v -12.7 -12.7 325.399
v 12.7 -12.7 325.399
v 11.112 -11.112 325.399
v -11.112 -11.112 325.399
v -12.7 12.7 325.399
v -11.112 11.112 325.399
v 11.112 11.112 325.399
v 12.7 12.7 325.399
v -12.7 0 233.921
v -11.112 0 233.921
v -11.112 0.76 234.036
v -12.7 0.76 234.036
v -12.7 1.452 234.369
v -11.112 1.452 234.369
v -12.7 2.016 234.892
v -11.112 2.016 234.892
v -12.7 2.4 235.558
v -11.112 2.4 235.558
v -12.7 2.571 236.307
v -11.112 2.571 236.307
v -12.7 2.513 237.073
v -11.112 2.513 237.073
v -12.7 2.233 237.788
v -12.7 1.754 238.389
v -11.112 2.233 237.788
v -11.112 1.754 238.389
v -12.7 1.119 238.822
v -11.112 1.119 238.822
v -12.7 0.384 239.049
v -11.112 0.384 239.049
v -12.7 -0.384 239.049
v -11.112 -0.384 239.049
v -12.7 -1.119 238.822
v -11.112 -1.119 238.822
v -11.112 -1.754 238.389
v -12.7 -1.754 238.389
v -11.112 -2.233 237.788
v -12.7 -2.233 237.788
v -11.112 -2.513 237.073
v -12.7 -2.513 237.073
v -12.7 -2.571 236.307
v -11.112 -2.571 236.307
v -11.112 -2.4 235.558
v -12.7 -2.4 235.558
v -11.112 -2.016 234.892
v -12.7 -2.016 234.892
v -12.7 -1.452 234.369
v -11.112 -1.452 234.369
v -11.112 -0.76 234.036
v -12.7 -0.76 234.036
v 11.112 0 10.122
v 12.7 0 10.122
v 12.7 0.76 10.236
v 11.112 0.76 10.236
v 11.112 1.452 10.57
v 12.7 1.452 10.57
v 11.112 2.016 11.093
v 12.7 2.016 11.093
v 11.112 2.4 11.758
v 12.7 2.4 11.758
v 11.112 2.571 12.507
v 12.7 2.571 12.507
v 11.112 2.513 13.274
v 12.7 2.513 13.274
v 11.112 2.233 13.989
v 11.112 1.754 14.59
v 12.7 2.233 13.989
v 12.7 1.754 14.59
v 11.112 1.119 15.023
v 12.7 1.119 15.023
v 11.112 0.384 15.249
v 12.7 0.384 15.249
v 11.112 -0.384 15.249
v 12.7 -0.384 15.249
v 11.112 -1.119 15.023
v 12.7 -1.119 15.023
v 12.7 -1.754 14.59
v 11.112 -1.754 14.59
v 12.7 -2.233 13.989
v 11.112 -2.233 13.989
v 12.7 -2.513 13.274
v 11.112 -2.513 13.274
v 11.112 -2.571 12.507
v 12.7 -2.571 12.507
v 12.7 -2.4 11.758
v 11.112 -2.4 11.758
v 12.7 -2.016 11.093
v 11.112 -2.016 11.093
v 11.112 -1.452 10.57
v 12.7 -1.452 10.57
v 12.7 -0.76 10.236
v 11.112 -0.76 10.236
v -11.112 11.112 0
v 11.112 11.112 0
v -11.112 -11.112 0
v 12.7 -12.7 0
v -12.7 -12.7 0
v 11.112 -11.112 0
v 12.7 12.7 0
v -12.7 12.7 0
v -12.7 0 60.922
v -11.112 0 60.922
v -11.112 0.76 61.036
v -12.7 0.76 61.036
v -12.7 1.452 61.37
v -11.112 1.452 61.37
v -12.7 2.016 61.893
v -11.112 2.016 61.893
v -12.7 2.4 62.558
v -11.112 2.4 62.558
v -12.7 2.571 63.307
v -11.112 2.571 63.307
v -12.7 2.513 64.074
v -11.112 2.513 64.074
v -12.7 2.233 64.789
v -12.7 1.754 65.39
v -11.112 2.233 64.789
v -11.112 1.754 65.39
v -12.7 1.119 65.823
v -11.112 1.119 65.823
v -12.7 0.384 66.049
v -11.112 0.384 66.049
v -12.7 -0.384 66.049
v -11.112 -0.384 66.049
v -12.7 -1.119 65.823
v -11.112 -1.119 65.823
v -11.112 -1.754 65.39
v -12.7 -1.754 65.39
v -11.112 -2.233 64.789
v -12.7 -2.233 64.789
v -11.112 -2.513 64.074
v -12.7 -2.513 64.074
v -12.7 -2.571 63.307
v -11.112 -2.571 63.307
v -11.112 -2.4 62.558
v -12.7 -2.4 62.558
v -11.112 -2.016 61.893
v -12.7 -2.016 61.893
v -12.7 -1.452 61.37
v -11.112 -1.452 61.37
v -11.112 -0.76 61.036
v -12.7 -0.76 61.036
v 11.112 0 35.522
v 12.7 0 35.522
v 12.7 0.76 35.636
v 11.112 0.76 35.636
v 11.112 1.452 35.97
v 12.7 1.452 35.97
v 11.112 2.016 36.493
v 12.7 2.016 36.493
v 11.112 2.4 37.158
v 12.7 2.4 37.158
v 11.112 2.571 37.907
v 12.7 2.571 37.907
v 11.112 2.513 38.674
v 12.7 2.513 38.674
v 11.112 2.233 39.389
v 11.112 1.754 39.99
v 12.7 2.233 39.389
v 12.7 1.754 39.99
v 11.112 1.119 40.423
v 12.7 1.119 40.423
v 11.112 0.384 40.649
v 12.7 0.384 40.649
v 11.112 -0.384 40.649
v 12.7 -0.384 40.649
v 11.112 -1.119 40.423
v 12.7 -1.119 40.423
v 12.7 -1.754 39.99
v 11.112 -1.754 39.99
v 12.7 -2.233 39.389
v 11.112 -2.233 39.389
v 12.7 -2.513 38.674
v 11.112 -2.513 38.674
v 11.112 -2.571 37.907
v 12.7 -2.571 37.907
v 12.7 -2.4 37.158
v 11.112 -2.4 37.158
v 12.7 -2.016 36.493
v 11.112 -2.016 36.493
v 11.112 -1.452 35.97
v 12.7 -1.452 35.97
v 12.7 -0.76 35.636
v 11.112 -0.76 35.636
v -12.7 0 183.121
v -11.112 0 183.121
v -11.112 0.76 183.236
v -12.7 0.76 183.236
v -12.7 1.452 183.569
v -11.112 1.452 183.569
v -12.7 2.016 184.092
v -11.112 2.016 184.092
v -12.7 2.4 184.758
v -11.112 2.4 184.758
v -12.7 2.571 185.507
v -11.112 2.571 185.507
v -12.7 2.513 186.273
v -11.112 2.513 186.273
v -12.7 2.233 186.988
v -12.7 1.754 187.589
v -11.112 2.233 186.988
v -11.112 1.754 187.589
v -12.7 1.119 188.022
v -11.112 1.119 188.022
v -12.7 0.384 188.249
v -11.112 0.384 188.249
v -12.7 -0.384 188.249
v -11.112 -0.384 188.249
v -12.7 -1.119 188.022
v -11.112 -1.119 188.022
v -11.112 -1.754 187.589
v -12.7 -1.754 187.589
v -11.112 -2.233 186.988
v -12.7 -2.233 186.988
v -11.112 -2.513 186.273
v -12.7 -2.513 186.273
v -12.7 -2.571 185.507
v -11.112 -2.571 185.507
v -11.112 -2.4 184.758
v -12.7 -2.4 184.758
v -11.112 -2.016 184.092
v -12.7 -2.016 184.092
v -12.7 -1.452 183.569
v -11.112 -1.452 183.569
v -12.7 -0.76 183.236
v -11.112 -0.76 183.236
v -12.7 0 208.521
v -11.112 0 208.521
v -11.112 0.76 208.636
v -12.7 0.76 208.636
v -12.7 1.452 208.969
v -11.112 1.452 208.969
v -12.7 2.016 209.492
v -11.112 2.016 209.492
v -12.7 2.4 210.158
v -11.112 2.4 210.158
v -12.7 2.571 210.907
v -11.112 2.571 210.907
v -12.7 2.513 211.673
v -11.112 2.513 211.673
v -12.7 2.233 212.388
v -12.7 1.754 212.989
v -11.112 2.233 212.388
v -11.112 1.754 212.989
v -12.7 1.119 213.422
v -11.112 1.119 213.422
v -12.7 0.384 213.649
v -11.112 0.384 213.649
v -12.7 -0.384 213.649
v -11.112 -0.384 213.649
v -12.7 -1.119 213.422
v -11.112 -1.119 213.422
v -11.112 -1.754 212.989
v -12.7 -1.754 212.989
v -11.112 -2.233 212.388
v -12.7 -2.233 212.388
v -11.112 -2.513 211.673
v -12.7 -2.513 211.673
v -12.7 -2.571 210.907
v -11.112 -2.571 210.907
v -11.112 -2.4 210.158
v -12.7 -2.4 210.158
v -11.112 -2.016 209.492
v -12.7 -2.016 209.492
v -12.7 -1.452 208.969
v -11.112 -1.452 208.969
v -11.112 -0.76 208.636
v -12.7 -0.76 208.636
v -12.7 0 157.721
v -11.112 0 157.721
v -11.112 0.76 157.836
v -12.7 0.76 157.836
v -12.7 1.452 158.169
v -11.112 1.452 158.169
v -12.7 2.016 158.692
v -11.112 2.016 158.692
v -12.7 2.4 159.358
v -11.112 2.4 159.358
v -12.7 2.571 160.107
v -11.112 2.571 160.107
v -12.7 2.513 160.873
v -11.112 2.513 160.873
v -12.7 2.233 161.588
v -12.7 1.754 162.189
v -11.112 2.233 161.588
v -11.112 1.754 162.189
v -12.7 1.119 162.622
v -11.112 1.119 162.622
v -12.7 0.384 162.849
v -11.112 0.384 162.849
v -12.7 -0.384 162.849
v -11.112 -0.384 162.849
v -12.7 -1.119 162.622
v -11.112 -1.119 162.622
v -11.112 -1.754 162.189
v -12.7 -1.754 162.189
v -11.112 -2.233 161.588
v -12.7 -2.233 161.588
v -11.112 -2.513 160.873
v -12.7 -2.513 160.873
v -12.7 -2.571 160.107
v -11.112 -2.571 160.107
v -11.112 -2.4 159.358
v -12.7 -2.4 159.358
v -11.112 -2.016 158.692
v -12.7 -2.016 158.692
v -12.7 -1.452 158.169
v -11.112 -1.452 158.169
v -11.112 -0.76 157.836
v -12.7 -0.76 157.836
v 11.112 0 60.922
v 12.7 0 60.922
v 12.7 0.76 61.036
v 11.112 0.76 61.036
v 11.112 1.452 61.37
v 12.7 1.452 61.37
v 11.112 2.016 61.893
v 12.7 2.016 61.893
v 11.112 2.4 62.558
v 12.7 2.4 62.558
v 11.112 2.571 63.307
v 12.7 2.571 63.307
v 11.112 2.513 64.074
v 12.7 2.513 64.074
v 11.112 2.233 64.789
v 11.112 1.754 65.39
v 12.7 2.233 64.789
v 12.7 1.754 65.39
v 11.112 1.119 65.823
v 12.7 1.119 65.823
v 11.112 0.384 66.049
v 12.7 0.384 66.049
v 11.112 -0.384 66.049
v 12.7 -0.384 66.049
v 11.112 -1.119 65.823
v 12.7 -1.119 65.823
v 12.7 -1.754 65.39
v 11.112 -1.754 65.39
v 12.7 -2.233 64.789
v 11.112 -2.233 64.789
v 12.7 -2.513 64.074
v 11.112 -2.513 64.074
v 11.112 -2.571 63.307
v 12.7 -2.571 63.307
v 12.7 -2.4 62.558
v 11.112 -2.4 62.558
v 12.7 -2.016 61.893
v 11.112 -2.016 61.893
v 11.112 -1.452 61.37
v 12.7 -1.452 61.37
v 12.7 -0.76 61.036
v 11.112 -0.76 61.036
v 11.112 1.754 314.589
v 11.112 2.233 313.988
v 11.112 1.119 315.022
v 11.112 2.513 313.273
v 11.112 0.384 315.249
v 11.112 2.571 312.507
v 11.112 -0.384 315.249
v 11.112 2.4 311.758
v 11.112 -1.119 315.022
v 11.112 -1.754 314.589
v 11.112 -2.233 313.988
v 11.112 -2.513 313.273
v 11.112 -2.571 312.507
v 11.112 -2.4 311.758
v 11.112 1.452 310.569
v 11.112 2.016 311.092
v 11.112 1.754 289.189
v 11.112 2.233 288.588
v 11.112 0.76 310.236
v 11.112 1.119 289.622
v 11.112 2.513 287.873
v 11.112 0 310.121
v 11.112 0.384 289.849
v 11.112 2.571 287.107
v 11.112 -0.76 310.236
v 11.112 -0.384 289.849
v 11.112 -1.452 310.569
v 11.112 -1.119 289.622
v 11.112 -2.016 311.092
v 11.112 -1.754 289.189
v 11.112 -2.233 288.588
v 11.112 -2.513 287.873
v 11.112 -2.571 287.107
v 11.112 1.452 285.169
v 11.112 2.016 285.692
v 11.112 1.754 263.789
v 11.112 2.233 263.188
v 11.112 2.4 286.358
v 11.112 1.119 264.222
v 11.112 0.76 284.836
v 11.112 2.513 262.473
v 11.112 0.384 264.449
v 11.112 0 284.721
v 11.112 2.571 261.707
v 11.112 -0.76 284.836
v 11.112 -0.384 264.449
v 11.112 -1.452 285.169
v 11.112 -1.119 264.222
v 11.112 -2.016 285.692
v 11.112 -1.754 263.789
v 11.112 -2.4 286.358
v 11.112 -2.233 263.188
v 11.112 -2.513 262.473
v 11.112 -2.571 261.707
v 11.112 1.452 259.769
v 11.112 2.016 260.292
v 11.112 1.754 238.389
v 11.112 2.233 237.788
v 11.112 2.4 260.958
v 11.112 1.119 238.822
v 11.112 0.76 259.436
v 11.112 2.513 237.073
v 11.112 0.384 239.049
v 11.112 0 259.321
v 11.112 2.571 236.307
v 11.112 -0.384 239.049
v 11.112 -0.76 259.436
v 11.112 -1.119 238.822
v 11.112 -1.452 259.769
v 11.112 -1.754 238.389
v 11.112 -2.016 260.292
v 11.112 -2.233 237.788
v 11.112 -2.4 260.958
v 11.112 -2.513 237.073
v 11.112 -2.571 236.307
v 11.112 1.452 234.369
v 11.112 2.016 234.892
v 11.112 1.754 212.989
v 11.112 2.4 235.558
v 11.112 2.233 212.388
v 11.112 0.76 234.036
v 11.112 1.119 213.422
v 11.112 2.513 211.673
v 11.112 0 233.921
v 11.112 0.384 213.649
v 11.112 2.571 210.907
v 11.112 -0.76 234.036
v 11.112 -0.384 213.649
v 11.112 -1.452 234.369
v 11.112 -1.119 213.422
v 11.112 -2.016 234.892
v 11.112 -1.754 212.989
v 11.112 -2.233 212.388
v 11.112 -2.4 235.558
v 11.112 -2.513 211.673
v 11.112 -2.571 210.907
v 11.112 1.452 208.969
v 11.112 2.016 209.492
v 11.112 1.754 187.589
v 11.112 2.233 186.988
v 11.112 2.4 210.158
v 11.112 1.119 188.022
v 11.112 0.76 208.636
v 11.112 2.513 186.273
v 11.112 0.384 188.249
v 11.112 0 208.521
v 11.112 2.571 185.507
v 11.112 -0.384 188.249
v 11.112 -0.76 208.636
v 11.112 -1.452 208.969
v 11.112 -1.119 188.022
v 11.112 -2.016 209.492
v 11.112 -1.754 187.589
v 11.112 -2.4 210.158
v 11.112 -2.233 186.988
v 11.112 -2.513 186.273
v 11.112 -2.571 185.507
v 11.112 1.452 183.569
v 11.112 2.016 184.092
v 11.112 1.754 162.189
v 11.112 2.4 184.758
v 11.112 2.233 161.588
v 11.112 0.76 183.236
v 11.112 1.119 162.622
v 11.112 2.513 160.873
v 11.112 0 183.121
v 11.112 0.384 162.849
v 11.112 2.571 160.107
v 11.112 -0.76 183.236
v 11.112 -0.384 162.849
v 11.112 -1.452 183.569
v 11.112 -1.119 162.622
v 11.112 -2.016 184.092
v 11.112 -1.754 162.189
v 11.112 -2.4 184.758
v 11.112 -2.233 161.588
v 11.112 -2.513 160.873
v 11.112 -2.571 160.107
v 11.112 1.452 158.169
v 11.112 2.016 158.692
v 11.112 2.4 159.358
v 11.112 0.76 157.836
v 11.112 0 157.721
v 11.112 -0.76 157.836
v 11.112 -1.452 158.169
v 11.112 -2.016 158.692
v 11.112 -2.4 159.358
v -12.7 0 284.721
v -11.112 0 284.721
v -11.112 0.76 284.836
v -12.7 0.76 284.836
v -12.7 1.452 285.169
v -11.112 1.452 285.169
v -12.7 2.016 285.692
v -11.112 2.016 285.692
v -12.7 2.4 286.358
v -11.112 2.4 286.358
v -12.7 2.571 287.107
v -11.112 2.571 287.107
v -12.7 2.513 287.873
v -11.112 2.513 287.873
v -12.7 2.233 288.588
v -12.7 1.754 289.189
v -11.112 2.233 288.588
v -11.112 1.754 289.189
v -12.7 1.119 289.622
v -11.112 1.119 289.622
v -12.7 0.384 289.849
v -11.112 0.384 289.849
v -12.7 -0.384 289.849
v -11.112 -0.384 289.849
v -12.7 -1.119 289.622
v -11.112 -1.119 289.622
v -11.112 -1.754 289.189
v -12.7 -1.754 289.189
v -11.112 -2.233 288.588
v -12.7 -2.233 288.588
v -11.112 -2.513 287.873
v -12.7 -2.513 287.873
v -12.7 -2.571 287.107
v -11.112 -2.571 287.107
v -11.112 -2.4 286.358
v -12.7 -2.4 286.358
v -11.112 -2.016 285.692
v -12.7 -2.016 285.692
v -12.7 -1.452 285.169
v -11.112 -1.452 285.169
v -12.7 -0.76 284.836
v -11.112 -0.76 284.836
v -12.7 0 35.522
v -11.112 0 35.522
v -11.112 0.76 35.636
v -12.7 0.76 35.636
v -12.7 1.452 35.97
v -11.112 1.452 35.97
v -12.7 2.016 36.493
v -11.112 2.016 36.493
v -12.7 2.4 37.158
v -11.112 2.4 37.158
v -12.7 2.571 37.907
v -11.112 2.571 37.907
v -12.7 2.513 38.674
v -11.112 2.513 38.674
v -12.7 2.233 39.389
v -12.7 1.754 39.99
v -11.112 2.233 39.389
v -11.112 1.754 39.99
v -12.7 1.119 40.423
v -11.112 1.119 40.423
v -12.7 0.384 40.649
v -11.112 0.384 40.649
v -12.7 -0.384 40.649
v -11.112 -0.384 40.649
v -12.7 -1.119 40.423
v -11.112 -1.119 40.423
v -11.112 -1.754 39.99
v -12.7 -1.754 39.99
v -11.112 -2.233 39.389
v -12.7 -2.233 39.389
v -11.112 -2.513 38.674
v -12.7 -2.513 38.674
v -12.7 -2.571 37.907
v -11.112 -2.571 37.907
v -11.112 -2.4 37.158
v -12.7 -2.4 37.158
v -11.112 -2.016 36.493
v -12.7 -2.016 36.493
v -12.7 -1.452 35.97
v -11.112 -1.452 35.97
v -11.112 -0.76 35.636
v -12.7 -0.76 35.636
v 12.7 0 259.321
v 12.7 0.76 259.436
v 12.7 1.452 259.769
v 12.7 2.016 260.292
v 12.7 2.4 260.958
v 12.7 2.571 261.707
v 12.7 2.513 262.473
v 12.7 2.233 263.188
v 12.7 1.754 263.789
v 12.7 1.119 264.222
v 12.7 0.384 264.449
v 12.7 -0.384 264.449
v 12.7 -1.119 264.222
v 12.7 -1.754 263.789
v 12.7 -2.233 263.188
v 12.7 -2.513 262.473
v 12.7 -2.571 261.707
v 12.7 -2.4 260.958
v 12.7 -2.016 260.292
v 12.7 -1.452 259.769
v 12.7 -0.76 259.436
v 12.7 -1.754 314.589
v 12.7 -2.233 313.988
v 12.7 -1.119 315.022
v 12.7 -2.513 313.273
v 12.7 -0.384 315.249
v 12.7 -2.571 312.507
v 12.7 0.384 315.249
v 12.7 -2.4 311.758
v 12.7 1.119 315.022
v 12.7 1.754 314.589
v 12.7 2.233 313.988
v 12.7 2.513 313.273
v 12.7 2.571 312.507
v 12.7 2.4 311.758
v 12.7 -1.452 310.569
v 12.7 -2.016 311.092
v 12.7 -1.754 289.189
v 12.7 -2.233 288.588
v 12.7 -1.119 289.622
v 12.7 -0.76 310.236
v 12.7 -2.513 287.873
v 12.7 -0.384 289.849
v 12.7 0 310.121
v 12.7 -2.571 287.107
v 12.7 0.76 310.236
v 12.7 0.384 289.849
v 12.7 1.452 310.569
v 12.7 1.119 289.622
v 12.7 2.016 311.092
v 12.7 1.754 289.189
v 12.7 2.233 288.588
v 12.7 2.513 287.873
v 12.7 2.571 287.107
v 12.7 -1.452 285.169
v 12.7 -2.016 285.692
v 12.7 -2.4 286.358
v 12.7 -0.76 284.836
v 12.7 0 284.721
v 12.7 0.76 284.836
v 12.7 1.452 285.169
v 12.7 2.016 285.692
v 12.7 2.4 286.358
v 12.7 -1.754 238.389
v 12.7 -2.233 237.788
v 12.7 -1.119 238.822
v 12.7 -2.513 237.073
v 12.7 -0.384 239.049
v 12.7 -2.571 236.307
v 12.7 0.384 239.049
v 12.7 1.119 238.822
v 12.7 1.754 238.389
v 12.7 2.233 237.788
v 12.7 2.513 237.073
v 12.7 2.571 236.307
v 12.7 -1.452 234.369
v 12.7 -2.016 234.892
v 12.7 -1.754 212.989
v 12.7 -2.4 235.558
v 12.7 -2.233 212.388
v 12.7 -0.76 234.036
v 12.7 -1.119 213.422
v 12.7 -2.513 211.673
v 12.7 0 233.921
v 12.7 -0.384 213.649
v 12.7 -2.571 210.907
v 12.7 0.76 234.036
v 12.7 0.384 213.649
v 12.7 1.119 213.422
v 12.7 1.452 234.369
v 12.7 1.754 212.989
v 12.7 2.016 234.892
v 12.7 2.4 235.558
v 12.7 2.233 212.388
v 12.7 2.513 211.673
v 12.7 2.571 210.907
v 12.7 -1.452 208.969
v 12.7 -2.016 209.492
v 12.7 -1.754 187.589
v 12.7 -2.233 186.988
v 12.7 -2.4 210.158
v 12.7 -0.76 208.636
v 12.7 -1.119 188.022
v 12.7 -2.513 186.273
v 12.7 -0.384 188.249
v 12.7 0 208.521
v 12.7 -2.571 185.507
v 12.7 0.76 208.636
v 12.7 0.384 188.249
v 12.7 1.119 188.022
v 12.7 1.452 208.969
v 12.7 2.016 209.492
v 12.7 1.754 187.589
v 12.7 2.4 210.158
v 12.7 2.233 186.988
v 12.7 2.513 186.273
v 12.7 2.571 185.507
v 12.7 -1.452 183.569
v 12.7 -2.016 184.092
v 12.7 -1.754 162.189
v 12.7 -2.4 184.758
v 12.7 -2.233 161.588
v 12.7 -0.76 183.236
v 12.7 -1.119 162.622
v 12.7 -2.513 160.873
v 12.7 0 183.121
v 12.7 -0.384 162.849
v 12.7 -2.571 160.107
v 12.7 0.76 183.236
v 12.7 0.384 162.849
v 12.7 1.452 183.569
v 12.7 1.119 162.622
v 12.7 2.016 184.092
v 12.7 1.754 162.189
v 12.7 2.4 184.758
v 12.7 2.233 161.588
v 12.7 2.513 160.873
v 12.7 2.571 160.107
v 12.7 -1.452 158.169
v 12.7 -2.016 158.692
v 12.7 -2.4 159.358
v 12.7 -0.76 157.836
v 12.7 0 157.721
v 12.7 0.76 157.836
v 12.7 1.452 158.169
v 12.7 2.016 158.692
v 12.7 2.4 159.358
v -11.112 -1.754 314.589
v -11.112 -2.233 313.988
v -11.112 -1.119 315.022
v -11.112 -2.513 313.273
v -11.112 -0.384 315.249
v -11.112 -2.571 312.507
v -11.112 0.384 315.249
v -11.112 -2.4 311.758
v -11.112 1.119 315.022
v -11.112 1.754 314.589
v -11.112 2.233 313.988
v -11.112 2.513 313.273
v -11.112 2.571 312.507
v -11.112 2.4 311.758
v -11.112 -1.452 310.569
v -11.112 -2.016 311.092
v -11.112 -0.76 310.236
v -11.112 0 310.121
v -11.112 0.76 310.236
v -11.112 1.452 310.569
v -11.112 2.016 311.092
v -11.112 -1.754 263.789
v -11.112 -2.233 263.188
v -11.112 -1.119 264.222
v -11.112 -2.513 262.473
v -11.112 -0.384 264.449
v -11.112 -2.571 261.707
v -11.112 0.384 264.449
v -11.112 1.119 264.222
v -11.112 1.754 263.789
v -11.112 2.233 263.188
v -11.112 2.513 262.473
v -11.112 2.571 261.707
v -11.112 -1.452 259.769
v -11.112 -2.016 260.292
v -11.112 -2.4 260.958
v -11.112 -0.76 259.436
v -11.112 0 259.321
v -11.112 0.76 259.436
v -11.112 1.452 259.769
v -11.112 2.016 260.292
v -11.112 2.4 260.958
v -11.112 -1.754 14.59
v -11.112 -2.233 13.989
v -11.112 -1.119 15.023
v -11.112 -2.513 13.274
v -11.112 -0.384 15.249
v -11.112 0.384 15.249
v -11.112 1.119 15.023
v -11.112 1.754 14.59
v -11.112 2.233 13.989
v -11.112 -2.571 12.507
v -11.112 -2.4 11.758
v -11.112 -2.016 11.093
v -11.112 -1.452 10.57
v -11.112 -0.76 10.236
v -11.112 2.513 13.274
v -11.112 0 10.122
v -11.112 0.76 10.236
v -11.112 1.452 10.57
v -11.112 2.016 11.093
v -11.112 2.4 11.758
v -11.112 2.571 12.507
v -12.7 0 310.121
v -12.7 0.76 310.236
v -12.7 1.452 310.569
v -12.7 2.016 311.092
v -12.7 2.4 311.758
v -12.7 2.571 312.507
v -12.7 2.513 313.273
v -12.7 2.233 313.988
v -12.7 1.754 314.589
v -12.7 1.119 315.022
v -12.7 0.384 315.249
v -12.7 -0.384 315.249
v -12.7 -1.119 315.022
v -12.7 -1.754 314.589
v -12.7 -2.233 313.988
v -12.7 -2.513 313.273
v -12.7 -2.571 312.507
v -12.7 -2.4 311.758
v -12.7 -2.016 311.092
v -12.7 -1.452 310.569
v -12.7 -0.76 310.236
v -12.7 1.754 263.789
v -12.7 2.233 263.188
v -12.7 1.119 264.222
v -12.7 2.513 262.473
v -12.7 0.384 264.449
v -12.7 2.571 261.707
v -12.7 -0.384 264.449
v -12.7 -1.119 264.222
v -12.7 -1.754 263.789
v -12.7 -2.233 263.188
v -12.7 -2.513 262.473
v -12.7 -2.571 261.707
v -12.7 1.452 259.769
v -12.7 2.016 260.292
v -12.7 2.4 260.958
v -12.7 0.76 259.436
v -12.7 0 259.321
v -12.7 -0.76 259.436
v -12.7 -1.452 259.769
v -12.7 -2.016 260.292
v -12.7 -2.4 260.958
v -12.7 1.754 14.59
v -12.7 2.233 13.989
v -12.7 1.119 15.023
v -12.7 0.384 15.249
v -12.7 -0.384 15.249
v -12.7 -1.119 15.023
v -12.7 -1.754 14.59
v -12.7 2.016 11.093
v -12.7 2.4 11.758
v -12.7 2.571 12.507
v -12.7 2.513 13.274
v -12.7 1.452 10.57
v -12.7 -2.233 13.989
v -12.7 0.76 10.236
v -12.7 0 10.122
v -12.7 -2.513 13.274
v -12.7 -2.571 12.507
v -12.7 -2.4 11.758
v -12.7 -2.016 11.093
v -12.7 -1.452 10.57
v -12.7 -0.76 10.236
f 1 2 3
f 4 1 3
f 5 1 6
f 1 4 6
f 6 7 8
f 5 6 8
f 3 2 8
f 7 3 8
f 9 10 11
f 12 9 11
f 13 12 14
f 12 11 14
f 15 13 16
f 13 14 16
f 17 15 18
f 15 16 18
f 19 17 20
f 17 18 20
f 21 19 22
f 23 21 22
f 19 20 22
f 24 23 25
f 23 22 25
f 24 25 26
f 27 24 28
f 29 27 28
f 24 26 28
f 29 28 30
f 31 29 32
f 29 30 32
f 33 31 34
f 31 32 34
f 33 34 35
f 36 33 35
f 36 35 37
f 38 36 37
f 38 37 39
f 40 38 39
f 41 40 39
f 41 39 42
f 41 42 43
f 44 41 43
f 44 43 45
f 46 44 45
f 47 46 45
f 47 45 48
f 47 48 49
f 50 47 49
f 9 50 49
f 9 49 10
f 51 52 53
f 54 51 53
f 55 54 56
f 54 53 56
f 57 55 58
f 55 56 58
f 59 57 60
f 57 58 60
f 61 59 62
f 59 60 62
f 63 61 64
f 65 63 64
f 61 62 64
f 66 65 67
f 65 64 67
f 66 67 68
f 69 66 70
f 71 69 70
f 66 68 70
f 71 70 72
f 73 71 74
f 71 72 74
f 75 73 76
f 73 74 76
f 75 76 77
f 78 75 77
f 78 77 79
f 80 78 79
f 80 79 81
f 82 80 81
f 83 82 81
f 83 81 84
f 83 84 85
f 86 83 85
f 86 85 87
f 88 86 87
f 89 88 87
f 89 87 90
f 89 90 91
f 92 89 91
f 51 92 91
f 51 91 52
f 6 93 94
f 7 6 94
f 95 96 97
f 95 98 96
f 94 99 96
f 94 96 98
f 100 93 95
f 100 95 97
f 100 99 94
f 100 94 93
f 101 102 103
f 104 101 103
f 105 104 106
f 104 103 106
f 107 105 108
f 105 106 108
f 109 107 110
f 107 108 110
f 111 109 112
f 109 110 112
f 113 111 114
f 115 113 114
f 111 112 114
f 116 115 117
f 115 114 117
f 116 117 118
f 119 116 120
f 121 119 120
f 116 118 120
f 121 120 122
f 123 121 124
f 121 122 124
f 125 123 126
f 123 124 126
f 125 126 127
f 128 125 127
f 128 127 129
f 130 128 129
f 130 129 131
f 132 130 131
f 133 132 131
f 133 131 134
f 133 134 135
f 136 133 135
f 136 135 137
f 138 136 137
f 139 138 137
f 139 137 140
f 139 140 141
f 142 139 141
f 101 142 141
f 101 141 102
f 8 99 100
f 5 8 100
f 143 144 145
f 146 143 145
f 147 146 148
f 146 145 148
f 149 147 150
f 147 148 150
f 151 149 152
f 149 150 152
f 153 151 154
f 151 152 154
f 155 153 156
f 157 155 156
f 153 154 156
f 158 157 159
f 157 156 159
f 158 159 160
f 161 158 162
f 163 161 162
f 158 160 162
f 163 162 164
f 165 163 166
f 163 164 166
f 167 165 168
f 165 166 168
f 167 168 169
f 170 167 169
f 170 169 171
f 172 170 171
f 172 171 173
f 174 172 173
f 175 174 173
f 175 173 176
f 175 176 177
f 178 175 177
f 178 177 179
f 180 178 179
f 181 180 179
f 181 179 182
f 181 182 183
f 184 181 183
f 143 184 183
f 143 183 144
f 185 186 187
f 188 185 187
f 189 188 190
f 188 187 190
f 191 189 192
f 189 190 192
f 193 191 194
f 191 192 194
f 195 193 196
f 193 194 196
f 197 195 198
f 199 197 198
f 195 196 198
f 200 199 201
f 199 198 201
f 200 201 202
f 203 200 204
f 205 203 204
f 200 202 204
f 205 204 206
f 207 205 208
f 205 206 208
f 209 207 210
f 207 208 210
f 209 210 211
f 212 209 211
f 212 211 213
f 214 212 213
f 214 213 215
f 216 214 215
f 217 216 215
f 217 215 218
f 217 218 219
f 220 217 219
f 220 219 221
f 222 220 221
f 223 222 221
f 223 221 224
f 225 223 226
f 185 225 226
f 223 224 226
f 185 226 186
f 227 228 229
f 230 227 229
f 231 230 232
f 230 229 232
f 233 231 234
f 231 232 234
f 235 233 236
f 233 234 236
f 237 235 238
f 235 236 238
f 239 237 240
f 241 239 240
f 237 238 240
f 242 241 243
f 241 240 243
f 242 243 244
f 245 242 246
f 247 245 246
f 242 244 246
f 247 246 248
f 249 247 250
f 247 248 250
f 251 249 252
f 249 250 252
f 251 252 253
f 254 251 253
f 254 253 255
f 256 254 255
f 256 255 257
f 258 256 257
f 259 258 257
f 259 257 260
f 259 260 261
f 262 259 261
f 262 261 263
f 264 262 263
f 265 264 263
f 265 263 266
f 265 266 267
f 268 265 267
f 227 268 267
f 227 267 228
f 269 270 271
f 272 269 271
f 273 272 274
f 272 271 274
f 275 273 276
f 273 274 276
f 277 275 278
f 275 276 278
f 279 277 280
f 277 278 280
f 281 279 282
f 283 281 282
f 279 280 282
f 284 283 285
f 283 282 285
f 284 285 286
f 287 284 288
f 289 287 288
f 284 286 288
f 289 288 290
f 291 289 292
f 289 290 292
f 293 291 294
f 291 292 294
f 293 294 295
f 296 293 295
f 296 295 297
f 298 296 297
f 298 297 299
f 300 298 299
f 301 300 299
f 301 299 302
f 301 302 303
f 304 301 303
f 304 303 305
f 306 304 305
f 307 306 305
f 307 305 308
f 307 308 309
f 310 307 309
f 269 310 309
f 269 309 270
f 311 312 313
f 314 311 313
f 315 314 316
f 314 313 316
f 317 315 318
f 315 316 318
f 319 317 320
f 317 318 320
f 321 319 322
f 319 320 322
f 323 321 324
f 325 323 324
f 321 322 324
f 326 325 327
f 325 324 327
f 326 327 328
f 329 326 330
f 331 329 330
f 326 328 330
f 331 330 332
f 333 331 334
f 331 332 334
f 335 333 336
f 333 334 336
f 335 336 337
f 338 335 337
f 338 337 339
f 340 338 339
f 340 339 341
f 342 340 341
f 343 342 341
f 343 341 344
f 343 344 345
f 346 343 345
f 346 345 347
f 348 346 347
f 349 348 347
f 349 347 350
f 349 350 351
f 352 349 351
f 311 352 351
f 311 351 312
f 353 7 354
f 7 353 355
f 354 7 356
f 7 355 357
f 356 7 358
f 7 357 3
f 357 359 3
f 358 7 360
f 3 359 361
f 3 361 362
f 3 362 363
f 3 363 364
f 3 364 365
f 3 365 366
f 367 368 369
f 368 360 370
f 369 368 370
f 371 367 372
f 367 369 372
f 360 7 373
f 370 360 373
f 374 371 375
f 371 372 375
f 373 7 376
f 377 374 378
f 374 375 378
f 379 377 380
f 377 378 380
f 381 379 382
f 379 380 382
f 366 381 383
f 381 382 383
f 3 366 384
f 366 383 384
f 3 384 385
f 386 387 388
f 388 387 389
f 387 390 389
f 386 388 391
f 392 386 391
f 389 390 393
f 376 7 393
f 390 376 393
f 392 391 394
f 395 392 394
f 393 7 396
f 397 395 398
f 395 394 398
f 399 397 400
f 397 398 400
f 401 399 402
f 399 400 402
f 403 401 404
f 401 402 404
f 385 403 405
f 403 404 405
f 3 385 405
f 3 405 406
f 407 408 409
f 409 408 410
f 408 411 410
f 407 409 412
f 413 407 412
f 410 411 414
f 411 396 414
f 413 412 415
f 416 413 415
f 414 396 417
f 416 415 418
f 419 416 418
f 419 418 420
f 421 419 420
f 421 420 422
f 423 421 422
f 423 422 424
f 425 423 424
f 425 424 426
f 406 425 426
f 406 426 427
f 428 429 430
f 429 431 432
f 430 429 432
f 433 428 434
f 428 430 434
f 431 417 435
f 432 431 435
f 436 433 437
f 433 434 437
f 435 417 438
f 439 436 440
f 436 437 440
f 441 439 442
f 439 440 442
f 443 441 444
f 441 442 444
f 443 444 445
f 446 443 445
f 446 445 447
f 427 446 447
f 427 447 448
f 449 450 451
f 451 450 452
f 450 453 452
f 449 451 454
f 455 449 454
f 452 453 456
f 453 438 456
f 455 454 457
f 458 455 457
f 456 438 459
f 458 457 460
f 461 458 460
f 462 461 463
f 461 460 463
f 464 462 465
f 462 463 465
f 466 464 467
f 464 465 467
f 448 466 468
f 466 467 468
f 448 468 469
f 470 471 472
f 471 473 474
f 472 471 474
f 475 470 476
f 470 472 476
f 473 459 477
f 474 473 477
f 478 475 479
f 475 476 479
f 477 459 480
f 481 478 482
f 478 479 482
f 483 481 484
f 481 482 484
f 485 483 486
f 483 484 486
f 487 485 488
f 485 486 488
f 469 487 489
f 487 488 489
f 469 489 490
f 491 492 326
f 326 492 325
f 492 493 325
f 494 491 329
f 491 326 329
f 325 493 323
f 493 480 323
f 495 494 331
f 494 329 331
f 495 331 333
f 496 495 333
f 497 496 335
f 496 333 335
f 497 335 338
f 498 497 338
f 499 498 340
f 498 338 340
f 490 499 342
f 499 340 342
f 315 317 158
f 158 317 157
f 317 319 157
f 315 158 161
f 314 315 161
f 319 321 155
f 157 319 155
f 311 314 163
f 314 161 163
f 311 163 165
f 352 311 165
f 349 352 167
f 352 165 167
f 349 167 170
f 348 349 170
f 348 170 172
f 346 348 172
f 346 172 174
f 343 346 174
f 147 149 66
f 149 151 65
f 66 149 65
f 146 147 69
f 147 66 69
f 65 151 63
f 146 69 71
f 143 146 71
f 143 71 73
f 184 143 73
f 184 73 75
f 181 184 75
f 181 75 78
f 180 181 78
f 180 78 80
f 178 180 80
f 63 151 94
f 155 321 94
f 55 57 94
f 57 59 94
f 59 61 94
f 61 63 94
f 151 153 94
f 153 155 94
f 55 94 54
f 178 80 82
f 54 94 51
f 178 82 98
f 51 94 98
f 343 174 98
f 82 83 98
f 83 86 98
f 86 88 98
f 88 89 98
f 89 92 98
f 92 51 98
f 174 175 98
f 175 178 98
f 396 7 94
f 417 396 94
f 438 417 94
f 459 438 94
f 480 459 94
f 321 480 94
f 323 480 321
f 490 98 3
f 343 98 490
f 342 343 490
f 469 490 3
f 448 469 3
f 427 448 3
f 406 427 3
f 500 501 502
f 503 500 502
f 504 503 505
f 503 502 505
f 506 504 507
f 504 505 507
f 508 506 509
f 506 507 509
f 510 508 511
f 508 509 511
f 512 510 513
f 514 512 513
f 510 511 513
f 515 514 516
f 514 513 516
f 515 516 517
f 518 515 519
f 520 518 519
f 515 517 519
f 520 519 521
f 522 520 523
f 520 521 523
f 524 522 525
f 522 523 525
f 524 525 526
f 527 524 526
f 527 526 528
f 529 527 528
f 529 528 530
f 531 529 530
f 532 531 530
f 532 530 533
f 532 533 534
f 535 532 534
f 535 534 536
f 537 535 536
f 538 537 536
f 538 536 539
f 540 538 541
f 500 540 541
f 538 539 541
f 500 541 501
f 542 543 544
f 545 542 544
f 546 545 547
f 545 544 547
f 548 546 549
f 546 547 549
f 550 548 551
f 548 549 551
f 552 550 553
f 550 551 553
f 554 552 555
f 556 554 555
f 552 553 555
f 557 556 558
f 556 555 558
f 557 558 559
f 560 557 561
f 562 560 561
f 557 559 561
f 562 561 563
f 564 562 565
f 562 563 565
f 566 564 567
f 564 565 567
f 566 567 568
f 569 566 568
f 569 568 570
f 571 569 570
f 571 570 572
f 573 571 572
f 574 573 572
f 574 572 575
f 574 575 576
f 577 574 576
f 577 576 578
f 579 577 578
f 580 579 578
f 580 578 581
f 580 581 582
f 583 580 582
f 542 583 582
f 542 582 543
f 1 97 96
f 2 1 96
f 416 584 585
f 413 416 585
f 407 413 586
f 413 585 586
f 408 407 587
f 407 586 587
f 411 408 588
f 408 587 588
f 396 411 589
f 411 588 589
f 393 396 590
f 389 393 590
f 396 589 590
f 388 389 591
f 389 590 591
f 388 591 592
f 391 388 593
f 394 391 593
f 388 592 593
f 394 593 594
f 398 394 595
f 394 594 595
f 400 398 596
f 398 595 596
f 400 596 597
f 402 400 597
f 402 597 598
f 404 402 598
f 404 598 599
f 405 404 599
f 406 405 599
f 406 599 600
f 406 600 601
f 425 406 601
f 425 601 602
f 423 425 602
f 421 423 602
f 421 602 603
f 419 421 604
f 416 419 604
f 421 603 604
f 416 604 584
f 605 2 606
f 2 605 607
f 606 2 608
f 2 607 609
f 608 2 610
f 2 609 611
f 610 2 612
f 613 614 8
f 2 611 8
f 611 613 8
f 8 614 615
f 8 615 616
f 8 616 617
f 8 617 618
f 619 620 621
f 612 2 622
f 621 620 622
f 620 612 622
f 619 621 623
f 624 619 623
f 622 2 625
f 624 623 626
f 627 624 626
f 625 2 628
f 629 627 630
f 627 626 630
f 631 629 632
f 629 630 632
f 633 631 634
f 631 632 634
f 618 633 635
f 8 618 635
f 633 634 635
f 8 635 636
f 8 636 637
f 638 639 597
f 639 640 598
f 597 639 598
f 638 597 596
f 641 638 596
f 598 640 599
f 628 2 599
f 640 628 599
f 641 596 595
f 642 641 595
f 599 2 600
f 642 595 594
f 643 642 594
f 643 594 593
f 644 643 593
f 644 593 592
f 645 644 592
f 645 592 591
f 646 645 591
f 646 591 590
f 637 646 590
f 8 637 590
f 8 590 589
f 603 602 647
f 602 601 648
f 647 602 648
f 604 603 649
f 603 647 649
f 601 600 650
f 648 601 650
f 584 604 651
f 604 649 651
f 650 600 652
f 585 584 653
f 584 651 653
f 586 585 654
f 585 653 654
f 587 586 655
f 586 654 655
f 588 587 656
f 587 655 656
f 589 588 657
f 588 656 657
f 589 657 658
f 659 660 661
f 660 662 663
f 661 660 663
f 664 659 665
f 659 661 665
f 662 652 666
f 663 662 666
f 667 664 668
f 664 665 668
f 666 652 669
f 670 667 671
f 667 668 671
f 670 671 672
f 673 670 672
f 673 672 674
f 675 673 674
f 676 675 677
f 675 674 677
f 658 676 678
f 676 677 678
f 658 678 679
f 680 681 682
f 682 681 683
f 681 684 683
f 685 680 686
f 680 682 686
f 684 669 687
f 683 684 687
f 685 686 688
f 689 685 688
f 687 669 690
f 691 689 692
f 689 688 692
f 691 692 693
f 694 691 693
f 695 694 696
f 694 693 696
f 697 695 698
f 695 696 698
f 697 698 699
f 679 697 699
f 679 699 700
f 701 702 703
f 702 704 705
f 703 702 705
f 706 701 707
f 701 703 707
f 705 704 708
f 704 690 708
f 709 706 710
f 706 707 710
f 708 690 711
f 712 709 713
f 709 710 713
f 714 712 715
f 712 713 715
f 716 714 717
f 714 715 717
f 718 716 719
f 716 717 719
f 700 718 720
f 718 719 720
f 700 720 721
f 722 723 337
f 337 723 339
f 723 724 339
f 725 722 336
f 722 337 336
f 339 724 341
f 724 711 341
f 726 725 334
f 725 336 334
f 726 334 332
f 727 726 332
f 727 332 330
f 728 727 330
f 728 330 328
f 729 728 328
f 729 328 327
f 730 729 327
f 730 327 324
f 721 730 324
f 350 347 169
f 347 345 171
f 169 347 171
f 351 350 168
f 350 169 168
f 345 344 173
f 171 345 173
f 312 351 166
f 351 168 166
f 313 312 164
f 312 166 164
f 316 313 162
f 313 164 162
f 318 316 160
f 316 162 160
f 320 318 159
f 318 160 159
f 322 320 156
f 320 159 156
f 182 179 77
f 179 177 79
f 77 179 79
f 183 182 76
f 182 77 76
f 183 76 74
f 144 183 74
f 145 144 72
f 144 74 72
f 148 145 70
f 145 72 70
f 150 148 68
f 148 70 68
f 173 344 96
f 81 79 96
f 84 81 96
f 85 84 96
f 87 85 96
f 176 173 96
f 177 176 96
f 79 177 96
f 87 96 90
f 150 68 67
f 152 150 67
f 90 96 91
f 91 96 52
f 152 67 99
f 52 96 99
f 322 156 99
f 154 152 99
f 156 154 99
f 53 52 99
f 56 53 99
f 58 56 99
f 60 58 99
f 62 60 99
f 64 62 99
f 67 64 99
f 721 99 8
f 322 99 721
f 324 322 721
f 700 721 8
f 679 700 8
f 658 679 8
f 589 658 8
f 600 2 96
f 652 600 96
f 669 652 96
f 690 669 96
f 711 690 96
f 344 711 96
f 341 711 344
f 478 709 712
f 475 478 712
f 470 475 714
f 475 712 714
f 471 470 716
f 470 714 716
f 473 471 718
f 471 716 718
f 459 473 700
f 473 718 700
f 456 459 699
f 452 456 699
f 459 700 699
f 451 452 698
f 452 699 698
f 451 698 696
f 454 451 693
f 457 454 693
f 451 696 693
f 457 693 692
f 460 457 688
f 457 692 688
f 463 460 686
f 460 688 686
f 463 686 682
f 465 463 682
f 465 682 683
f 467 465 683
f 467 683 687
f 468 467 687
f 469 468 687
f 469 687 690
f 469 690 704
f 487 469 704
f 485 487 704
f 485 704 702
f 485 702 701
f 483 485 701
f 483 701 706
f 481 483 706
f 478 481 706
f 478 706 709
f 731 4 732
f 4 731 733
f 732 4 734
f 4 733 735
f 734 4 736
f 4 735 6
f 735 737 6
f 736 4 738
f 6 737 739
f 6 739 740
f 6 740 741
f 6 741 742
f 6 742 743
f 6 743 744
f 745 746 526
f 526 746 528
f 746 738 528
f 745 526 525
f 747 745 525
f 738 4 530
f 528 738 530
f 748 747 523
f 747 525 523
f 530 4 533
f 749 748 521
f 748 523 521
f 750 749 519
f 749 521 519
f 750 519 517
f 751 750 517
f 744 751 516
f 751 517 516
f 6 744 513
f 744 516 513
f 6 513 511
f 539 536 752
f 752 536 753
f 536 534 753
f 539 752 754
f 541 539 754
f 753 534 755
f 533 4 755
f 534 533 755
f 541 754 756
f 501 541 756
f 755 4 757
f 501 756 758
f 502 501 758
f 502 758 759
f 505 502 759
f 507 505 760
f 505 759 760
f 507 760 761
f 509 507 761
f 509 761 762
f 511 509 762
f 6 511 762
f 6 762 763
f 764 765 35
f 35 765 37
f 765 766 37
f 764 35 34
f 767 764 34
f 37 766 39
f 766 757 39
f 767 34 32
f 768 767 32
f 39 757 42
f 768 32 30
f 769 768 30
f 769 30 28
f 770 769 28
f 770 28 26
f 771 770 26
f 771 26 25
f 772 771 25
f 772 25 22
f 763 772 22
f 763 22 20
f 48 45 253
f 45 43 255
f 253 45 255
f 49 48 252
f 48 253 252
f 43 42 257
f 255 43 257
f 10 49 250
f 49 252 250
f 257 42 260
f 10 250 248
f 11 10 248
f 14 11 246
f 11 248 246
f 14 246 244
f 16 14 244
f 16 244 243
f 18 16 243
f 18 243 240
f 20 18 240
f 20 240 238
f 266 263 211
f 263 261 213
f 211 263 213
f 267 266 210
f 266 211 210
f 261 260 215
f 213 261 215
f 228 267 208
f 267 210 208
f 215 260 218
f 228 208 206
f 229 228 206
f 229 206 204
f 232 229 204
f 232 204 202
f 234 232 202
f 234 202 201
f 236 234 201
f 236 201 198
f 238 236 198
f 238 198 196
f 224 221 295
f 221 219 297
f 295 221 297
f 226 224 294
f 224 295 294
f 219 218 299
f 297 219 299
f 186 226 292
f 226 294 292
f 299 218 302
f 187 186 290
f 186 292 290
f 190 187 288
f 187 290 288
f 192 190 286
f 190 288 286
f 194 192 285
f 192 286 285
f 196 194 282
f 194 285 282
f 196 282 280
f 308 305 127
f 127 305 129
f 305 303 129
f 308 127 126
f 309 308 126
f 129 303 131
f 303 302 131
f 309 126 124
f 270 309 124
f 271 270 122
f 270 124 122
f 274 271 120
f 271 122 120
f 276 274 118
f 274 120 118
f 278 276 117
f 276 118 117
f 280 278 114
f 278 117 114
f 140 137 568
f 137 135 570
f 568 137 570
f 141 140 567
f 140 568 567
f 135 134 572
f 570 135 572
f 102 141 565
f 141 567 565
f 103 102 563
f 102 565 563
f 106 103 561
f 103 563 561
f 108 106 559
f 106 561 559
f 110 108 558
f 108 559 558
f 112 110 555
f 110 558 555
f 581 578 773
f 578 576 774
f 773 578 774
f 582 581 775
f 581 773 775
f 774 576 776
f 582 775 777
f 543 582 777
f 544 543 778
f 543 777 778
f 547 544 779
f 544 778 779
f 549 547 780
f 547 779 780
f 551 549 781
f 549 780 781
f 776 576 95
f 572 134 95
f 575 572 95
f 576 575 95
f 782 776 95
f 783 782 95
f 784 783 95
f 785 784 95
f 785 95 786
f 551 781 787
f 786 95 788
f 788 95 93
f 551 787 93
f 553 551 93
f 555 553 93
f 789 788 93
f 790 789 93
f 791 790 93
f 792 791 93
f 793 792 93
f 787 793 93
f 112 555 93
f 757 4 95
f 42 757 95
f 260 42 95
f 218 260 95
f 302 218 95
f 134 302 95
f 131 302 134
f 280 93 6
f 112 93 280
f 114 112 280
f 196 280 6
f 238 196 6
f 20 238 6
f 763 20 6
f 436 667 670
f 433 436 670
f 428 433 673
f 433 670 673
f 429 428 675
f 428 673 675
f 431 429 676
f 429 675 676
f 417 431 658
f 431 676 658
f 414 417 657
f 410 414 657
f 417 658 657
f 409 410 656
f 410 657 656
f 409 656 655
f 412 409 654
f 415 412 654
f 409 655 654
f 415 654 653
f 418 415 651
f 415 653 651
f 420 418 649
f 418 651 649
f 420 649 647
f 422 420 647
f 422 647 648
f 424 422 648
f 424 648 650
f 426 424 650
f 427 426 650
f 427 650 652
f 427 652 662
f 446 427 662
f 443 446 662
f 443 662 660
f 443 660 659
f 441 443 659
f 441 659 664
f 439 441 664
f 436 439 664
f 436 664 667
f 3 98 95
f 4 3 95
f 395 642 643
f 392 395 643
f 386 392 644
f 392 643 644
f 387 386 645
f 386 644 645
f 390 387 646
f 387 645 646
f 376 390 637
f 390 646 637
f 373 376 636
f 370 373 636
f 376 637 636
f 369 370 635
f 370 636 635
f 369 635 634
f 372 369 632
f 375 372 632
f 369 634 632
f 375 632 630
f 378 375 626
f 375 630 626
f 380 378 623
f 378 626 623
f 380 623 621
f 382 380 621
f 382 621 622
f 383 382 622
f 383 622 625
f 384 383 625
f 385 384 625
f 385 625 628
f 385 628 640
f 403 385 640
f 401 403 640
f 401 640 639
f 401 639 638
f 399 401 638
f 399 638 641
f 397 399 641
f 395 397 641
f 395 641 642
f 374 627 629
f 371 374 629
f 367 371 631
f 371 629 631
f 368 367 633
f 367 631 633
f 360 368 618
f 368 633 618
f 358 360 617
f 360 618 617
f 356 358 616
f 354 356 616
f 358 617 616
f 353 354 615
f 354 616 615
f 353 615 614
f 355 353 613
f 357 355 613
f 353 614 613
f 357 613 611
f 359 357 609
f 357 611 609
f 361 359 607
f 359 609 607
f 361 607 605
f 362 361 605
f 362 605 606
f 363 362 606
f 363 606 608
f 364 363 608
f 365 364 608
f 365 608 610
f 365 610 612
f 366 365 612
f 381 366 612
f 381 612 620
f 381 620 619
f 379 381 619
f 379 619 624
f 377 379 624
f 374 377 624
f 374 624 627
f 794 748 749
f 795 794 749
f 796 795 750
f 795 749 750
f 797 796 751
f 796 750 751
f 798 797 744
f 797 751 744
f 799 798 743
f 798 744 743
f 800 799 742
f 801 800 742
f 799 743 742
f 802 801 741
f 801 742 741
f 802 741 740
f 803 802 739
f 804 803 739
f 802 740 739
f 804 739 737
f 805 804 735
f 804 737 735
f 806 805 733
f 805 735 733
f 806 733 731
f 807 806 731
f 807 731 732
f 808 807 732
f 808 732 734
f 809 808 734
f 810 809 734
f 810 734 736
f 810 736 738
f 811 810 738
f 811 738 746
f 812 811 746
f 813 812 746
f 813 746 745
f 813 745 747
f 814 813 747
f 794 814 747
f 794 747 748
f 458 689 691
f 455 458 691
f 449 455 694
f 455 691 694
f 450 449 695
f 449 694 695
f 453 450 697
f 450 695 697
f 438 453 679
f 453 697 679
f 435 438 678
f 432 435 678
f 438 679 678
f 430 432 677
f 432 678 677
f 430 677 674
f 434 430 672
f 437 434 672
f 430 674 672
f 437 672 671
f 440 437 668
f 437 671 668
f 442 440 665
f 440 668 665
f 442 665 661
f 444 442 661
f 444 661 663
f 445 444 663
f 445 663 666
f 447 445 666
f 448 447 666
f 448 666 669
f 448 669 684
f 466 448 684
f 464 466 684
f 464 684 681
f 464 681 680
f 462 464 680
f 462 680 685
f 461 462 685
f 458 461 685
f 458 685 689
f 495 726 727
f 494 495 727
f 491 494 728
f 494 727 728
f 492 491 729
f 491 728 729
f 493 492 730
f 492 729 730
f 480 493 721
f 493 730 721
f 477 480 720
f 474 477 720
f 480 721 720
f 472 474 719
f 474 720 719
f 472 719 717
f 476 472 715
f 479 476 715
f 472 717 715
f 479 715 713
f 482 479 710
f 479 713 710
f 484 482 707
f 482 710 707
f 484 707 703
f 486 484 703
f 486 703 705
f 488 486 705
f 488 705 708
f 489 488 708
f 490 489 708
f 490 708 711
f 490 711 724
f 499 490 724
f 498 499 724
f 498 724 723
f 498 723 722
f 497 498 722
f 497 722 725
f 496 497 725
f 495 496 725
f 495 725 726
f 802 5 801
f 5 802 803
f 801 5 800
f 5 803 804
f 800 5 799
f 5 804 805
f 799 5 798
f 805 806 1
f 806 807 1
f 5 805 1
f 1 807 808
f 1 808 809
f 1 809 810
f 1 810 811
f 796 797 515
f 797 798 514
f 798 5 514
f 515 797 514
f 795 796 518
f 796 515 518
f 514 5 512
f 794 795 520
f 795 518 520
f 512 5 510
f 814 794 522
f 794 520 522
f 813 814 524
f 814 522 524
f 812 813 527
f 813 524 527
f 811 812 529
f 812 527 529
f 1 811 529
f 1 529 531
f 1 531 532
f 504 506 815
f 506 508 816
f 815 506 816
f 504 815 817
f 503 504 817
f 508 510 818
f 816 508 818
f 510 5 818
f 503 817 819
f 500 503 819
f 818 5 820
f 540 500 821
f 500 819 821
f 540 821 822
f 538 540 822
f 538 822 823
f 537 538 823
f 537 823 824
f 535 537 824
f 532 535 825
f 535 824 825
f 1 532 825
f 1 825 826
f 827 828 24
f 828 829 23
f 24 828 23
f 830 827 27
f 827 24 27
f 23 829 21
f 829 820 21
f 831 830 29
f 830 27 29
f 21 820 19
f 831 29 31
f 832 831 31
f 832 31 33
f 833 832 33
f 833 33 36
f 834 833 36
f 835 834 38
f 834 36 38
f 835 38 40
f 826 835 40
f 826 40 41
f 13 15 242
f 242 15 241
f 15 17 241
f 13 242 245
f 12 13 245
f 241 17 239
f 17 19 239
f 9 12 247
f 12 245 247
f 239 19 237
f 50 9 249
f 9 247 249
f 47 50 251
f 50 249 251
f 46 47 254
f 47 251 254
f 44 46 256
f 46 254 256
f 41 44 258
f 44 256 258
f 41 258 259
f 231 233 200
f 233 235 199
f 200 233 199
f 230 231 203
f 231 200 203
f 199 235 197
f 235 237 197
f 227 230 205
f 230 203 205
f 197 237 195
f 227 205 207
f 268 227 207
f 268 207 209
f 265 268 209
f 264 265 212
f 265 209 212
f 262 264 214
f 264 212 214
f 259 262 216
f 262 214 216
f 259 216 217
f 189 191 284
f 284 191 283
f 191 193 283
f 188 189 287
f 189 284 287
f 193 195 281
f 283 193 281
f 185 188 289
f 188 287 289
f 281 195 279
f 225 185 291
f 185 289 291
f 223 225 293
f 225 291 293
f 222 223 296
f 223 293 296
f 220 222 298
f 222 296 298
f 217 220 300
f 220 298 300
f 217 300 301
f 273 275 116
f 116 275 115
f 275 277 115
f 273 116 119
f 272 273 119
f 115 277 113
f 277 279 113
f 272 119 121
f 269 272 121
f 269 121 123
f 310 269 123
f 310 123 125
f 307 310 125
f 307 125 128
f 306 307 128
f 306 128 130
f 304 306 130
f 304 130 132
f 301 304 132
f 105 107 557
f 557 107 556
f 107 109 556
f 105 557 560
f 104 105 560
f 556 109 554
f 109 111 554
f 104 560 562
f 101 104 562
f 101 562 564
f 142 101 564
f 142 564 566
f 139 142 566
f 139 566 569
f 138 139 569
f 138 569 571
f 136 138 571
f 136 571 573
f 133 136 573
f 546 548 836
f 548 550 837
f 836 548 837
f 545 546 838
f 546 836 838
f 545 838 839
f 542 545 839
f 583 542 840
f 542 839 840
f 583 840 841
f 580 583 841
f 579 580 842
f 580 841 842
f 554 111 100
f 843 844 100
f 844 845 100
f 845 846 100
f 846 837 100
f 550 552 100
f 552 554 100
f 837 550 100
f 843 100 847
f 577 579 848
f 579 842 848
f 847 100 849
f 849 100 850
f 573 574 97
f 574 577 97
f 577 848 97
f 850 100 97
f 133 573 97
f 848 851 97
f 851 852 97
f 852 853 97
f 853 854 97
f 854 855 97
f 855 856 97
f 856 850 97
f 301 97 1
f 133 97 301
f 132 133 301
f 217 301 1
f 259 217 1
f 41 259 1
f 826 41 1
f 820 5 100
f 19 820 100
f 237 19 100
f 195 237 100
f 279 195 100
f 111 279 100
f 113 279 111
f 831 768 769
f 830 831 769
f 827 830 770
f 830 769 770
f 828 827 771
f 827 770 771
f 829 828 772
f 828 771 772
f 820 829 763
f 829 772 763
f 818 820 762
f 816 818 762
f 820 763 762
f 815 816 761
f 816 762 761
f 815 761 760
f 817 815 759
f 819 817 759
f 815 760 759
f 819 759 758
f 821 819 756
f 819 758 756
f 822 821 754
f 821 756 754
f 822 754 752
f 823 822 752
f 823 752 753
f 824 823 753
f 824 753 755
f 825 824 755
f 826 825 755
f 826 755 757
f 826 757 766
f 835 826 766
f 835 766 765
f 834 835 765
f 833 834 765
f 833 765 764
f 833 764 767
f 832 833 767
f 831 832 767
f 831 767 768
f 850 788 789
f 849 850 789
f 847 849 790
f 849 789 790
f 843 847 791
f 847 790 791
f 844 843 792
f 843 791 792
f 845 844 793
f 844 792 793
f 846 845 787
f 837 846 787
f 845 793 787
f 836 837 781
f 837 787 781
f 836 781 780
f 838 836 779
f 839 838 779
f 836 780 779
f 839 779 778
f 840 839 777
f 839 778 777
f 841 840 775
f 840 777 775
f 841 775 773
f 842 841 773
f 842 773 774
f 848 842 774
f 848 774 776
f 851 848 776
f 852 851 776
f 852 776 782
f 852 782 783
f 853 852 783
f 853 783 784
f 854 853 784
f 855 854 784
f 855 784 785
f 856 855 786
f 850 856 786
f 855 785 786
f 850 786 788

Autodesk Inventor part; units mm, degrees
ref_plane "YZ Plane" through (0, 0, 0) normal (1, 0, 0) x (0, 1, 0)
ref_plane "XZ Plane" through (0, 0, 0) normal (0, 1, 0) x (-1, 0, 0)
ref_plane "XY Plane" through (0, 0, 0) normal (0, 0, 1) x (1, 0, 0)
sketch "Sketch1" plane through (0, 0, 0) normal (0, 0, 1) x (1, 0, 0)
  line L0 (-12.7, -12.7) -> (-12.7, 12.7)
  line L1 (-12.7, 12.7) -> (12.7, 12.7)
  line L2 (12.7, 12.7) -> (12.7, -12.7)
  line L3 (12.7, -12.7) -> (-12.7, -12.7)
  line L4 (-12.7, -12.7) -> (12.7, 12.7) construction
  line L5 (-12.7, 12.7) -> (12.7, -12.7) construction
  line L6 (11.1125, 11.1125) -> (-11.1125, 11.1125)
  line L7 (-11.1125, 11.1125) -> (-11.1125, -11.1125)
  line L8 (-11.1125, -11.1125) -> (11.1125, -11.1125)
  line L9 (11.1125, -11.1125) -> (11.1125, 11.1125)
  point P0 (0, 0)
  dimension "d0" = 25.4
  dimension "d1" = 25.4
  dimension "d2" = 1.5875
extrude "Extrusion1" add sketch "Sketch1" along normal blind 609.6
sketch "Sketch2" plane through (12.7, -12.7, 0) normal (1, 0, 0) x (0, 0, -1)
  line L0 (0, 0) -> (0, 25.4) projected
  line L1 (0, 25.4) -> (-609.6, 25.4) projected
  line L2 (-609.6, 0) -> (-609.6, 25.4) projected
  line L3 (0, 0) -> (-609.6, 0) projected
  circle A0 centre (-596.9, 12.7) radius 2.5781
  circle A1 centre (-571.5, 12.7) radius 2.5781
  circle A2 centre (-546.1, 12.7) radius 2.5781
  line L4 (-304.8, 0) -> (-304.8, 25.4) construction
  circle A3 centre (-12.7, 12.7) radius 2.5781
  circle A4 centre (-38.1, 12.7) radius 2.5781
  circle A5 centre (-63.5, 12.7) radius 2.5781
  point P0 (0, 12.7)
  dimension "d5" = 5.1562
  dimension "d7" = 12.7
  dimension "d8" = 25.4
  dimension "d9" = 25.4
extrude "Extrusion2" cut sketch "Sketch2" against normal through all contours A0 | A1 | A2 | A3 | A4 | A5
sketch "Sketch5" plane through (-12.7, 12.7, 0) normal (0, 1, 0) x (1, 0, 0)
  line L0 (25.4, 0) -> (25.4, -609.6) projected
  line L1 (25.4, 0) -> (25.4, -223.7994)
  line L2 (25.4, -223.7994) -> (-0.9, -223.7994)
  line L3 (-0.9, -223.7994) -> (-0.9, -681.5571)
  line L4 (-0.9, -681.5571) -> (85.6151, -690.7866)
  line L5 (85.6151, -690.7866) -> (25.4, -223.7994)
  point P0 (12.7, 0)
  dimension "d15" = 223.7994
extrude "Extrusion4" cut sketch "Sketch5" against normal blind 101.6
sketch "Sketch6" plane through (12.7, -12.7, 0) normal (1, 0, 0) x (0, 0, -1)
  line L0 (-223.7994, 1.5875) -> (-223.7994, 23.8125) projected
  line L1 (-223.7994, 12.7) -> (-211.0994, 12.7)
  circle A0 centre (-211.0994, 12.7) radius 2.5781
  line L2 (-211.0994, 12.7) -> (-185.6994, 12.7)
  circle A1 centre (-185.6994, 12.7) radius 2.5781
  line L3 (-185.6994, 12.7) -> (-160.2994, 12.7)
  circle A2 centre (-160.2994, 12.7) radius 2.5781
  point P0 (0, 12.7)
  dimension "d18" = 12.7
  dimension "d19" = 5.1562
  dimension "d20" = 25.4
  dimension "d21" = 5.1562
  dimension "d22" = 25.4
  dimension "d23" = 5.1562
extrude "Extrusion5" cut sketch "Sketch6" against normal blind 50.8
sketch "Sketch7" plane through (-12.7, 12.7, 223.7994) normal (0, 0, 1) x (1, 0, 0)
  line L0 (0, -25.4) -> (0, 0) projected
  line L1 (25.4, -25.4) -> (0, -25.4) projected
  line L2 (25.4, 0) -> (25.4, -25.4) projected
  line L3 (0, 0) -> (25.4, 0) projected
  line L4 (23.8125, -1.5875) -> (1.5875, -1.5875) projected
  line L5 (23.8125, -23.8125) -> (23.8125, -1.5875) projected
  line L6 (1.5875, -23.8125) -> (23.8125, -23.8125) projected
  line L7 (1.5875, -1.5875) -> (1.5875, -23.8125) projected
  point P0 (12.7, -12.7)
extrude "Extrusion6" add sketch "Sketch7" along normal blind 127
sketch "Sketch8" plane through (12.7, -12.7, 0) normal (1, 0, 0) x (0, 0, -1)
  circle A0 centre (-211.0994, 12.7) radius 2.5781 projected
  line L0 (-211.0994, 12.7) -> (-236.4994, 12.7)
  line L1 (-236.4994, 12.7) -> (-261.8994, 12.7)
  circle A1 centre (-236.4994, 12.7) radius 2.5781
  circle A2 centre (-261.8994, 12.7) radius 2.5781
  line L2 (-350.7994, 25.4) -> (-350.7994, 0) projected
  line L3 (-350.7994, 12.7) -> (-338.0994, 12.7)
  line L4 (-338.0994, 12.7) -> (-312.6994, 12.7)
  line L5 (-312.6994, 12.7) -> (-287.2994, 12.7)
  circle A3 centre (-287.2994, 12.7) radius 2.5781
  circle A4 centre (-338.0994, 12.7) radius 2.5781
  circle A5 centre (-312.6994, 12.7) radius 2.5781
  point P0 (0, 12.7)
  dimension "d28" = 25.4
  dimension "d29" = 25.4
  dimension "d30" = 5.1562
  dimension "d31" = 5.1562
  dimension "d32" = 12.7
  dimension "d33" = 25.4
  dimension "d34" = 25.4
  dimension "d35" = 5.1562
  dimension "d36" = 5.1562
  dimension "d37" = 5.1562
extrude "Extrusion7" cut sketch "Sketch8" against normal blind 92.075 contours A2 | A1 L1 L0 | L0 L1 A1 | A4 L4 L3 | A3 | A5 L5 L4 | L4 L5 A5 | L3 L4 A4
sketch "Sketch9" plane through (0, 0, 0) normal (0, 0, -1) x (-1, 0, 0)
  line L0 (-12.7, -12.7) -> (-12.7, 12.7) projected
  line L1 (12.7, -12.7) -> (-12.7, -12.7) projected
  line L2 (12.7, 12.7) -> (12.7, -12.7) projected
  line L3 (-12.7, 12.7) -> (12.7, 12.7) projected
  line L4 (-11.1125, 11.1125) -> (-11.1125, -11.1125) projected
  line L5 (11.1125, 11.1125) -> (-11.1125, 11.1125) projected
  line L6 (11.1125, -11.1125) -> (11.1125, 11.1125) projected
  line L7 (-11.1125, -11.1125) -> (11.1125, -11.1125) projected
  point P0 (0, 0)
extrude "Extrusion8" add sketch "Sketch9" along normal blind 152.4
sketch "Sketch10" plane through (12.7, -12.7, 350.7994) normal (1, 0, 0) x (0, 0, -1)
  line L0 (503.1994, 25.4) -> (503.1994, 0) projected
  line L1 (503.1994, 12.7) -> (490.4994, 12.7)
  line L2 (490.4994, 12.7) -> (465.0994, 12.7)
  line L3 (465.0994, 12.7) -> (439.6994, 12.7)
  circle A0 centre (439.6994, 12.7) radius 2.5781
  circle A1 centre (465.0994, 12.7) radius 2.5781
  circle A2 centre (490.4994, 12.7) radius 2.5781
  point P0 (350.7994, 12.7)
  dimension "d42" = 12.7
  dimension "d43" = 25.4
  dimension "d44" = 25.4
  dimension "d45" = 5.1562
  dimension "d46" = 5.1562
  dimension "d47" = 5.1562
extrude "Extrusion9" cut sketch "Sketch10" against normal blind 123.825
sketch "Sketch11" plane through (0, 0, -152.4) normal (0, 0, -1) x (-1, 0, 0)
  line L0 (12.7, -12.7) -> (12.7, 12.7) projected
  line L1 (12.7, 12.7) -> (-12.7, 12.7) projected
  line L2 (-12.7, 12.7) -> (-12.7, -12.7) projected
  line L3 (-12.7, -12.7) -> (12.7, -12.7) projected
  line L4 (-11.1125, 11.1125) -> (11.1125, 11.1125) projected
  line L5 (11.1125, 11.1125) -> (11.1125, -11.1125) projected
  line L6 (11.1125, -11.1125) -> (-11.1125, -11.1125) projected
  line L7 (-11.1125, -11.1125) -> (-11.1125, 11.1125) projected
  point P0 (0, 0)
extrude "Extrusion10" cut sketch "Sketch11" against normal blind 152.4
sketch "Sketch12" plane through (-12.7, 12.7, 350.7994) normal (0, 0, 1) x (1, 0, 0)
  line L0 (25.4, -25.4) -> (25.4, 0) projected
  line L1 (25.4, 0) -> (0, 0) projected
  line L2 (0, 0) -> (0, -25.4) projected
  line L3 (0, -25.4) -> (25.4, -25.4) projected
  line L4 (23.8125, -1.5875) -> (23.8125, -23.8125) projected
  line L5 (23.8125, -23.8125) -> (1.5875, -23.8125) projected
  line L6 (1.5875, -23.8125) -> (1.5875, -1.5875) projected
  line L7 (1.5875, -1.5875) -> (23.8125, -1.5875) projected
  point P0 (12.7, -12.7)
extrude "Extrusion11" add sketch "Sketch12" along normal blind 63.5
sketch "Sketch13" plane through (12.7, -12.7, 0) normal (1, 0, 0) x (0, 0, -1)
  circle A0 centre (-338.0994, 12.7) radius 2.5781 projected
  line L0 (-338.0994, 12.7) -> (-363.4994, 12.7)
  line L1 (-363.4994, 12.7) -> (-388.8994, 12.7)
  line L2 (-388.8994, 12.7) -> (-414.2994, 12.7)
  circle A1 centre (-363.4994, 12.7) radius 2.5781
  circle A2 centre (-388.8994, 12.7) radius 2.5781
  circle A3 centre (-414.2994, 12.7) radius 2.5781
  point P0 (0, 12.7)
  dimension "d54" = 25.4
  dimension "d55" = 25.4
  dimension "d58" = 25.4
  dimension "d59" = 5.1562
  dimension "d60" = 5.1562
  dimension "d61" = 5.1562
sketch "Sketch14" plane through (-12.7, 12.7, 414.2994) normal (0, 0, 1) x (1, 0, 0)
  line L0 (25.4, 0) -> (0, 0) projected
  line L1 (0, 0) -> (0, -25.4) projected
  line L2 (0, -25.4) -> (25.4, -25.4) projected
  line L3 (25.4, -25.4) -> (25.4, 0) projected
  line L4 (23.8125, -1.5875) -> (23.8125, -23.8125) projected
  line L5 (23.8125, -23.8125) -> (1.5875, -23.8125) projected
  line L6 (1.5875, -23.8125) -> (1.5875, -1.5875) projected
  line L7 (1.5875, -1.5875) -> (23.8125, -1.5875) projected
  point P0 (12.7, -12.7)
extrude "Extrusion12" add sketch "Sketch14" along normal blind 12.7
extrude "Extrusion13" cut sketch "Sketch13" against normal blind 47.625 contours A3 | A2 L2 L1 | L1 L2 A2 | A1 L1 L0 | L0 L1 A1
sketch "Sketch15" plane through (12.7, -12.7, 0) normal (1, 0, 0) x (0, 0, -1)
  circle A0 centre (-363.4994, 12.7) radius 2.5781 projected
  line L0 (-363.4994, 12.7) -> (-376.1994, 12.7)
  line L1 (-376.1994, 12.7) -> (-376.1994, 25.4)
  line L2 (0, 25.4) -> (-426.9994, 25.4) projected
  line L3 (-376.1994, 12.7) -> (-376.1994, -0.0996)
  line L4 (-376.1994, -0.0996) -> (-376.1994, -3.0916)
  line L5 (-376.1994, -3.0916) -> (-480.1709, -3.0916)
  line L6 (-480.1709, -3.0916) -> (-483.3081, 73.6134)
  line L7 (-483.3081, 73.6134) -> (-376.1994, 25.4)
  point P0 (0, 12.7)
  dimension "d64" = 12.7
extrude "Extrusion14" cut sketch "Sketch15" against normal blind 47.625 contours L3 L4 L5 L6 L7 L1
sketch "Sketch17" plane through (12.7, -12.7, 0) normal (1, 0, 0) x (0, 0, -1)
  circle A0 centre (-312.6994, 12.7) radius 2.5781 projected
  line L0 (-312.6994, 12.7) -> (-325.3994, 12.7)
  line L1 (0, 25.4) -> (-376.1994, 25.4) projected
  line L2 (-325.3994, 25.4) -> (-387.8769, 25.4)
  line L3 (-387.8769, 25.4) -> (-387.8769, -7.9808)
  line L4 (-387.8769, -7.9808) -> (-325.3994, -7.9808)
  line L5 (-325.3994, -7.9808) -> (-325.3994, 25.4)
  point P0 (0, 12.7)
  dimension "d67" = 12.7
extrude "Extrusion15" cut sketch "Sketch17" against normal blind 112.7125 contours L5 L4 L3 L2 L1
equation "\"d1\" = d0"
properties part number "24in long 1in square tube"
